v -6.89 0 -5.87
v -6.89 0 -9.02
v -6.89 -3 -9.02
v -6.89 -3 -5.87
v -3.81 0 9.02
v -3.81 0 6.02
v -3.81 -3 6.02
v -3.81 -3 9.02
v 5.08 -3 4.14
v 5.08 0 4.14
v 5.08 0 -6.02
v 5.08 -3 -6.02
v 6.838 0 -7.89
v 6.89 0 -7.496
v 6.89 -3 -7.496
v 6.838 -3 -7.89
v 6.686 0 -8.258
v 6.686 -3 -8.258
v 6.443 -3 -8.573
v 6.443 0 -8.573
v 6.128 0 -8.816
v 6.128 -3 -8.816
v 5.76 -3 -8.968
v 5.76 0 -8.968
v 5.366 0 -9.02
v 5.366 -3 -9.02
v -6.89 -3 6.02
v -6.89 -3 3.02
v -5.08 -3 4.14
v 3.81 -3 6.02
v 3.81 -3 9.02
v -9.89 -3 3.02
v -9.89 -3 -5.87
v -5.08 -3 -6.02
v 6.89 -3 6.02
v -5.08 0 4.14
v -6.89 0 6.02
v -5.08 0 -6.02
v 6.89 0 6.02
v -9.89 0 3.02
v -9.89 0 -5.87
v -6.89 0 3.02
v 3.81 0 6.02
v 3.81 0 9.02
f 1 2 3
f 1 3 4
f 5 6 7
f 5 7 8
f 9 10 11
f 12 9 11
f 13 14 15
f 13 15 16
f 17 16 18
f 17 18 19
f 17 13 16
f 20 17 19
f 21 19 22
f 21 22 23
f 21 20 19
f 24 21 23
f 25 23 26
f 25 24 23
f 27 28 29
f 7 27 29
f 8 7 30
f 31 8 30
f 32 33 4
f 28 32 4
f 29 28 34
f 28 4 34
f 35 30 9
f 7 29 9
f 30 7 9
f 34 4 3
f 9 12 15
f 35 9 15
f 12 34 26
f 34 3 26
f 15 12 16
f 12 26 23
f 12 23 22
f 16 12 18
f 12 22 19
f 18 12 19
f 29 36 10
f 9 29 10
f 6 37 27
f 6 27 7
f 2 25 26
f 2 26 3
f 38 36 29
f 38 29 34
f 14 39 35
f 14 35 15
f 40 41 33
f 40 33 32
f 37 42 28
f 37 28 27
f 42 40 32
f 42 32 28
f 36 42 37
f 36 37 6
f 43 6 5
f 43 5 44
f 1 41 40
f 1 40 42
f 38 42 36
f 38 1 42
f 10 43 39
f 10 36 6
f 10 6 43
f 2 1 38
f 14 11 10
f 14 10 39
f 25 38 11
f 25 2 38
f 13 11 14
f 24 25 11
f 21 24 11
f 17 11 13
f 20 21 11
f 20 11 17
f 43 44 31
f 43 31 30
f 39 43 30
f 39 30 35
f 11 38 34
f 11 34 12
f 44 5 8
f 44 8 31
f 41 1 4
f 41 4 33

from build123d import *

# Parameters (mm, degrees)
SKETCH_1_W      = 10.16
SKETCH_1_H      = 10.16
EXTRUDE_1_DEPTH = 3


with BuildPart() as part:
    # 스케치1 → 보스-돌출1 (new body)
    with BuildSketch(Plane(origin=(0, 0, 0), x_dir=(1, 0, 0), z_dir=(0, 1, 0))):
        with BuildLine():
            Line((6.88975, 6.0198), (6.88975, 7.4958))
            ThreePointArc((6.88975, 7.4958), (6.443380735, 8.573430735), (5.36575, 9.0198))
            Line((5.36575, 9.0198), (5.08, 9.0198))
            Line((5.08, 9.0198), (-5.08, 9.0198))
            Line((-5.08, 9.0198), (-6.88975, 9.0198))
            Line((-6.88975, 9.0198), (-6.88975, 5.8702))
            Line((-6.88975, 5.8702), (-9.88975, 5.8702))
            Line((-9.88975, 5.8702), (-9.88975, -3.0198))
            Line((-9.88975, -3.0198), (-6.88975, -3.0198))
            Line((-6.88975, -3.0198), (-6.88975, -6.0198))
            Line((-6.88975, -6.0198), (-3.81, -6.0198))
            Line((-3.81, -6.0198), (-3.81, -9.0198))
            Line((-3.81, -9.0198), (3.81, -9.0198))
            Line((3.81, -9.0198), (3.81, -6.0198))
            Line((3.81, -6.0198), (6.88975, -6.0198))
            Line((6.88975, -6.0198), (6.88975, 6.0198))
        make_face()
        with Locations((0, 0.9398)):
            Rectangle(SKETCH_1_W, SKETCH_1_H, mode=Mode.SUBTRACT)
    extrude(amount=-EXTRUDE_1_DEPTH)


solid = part.part
